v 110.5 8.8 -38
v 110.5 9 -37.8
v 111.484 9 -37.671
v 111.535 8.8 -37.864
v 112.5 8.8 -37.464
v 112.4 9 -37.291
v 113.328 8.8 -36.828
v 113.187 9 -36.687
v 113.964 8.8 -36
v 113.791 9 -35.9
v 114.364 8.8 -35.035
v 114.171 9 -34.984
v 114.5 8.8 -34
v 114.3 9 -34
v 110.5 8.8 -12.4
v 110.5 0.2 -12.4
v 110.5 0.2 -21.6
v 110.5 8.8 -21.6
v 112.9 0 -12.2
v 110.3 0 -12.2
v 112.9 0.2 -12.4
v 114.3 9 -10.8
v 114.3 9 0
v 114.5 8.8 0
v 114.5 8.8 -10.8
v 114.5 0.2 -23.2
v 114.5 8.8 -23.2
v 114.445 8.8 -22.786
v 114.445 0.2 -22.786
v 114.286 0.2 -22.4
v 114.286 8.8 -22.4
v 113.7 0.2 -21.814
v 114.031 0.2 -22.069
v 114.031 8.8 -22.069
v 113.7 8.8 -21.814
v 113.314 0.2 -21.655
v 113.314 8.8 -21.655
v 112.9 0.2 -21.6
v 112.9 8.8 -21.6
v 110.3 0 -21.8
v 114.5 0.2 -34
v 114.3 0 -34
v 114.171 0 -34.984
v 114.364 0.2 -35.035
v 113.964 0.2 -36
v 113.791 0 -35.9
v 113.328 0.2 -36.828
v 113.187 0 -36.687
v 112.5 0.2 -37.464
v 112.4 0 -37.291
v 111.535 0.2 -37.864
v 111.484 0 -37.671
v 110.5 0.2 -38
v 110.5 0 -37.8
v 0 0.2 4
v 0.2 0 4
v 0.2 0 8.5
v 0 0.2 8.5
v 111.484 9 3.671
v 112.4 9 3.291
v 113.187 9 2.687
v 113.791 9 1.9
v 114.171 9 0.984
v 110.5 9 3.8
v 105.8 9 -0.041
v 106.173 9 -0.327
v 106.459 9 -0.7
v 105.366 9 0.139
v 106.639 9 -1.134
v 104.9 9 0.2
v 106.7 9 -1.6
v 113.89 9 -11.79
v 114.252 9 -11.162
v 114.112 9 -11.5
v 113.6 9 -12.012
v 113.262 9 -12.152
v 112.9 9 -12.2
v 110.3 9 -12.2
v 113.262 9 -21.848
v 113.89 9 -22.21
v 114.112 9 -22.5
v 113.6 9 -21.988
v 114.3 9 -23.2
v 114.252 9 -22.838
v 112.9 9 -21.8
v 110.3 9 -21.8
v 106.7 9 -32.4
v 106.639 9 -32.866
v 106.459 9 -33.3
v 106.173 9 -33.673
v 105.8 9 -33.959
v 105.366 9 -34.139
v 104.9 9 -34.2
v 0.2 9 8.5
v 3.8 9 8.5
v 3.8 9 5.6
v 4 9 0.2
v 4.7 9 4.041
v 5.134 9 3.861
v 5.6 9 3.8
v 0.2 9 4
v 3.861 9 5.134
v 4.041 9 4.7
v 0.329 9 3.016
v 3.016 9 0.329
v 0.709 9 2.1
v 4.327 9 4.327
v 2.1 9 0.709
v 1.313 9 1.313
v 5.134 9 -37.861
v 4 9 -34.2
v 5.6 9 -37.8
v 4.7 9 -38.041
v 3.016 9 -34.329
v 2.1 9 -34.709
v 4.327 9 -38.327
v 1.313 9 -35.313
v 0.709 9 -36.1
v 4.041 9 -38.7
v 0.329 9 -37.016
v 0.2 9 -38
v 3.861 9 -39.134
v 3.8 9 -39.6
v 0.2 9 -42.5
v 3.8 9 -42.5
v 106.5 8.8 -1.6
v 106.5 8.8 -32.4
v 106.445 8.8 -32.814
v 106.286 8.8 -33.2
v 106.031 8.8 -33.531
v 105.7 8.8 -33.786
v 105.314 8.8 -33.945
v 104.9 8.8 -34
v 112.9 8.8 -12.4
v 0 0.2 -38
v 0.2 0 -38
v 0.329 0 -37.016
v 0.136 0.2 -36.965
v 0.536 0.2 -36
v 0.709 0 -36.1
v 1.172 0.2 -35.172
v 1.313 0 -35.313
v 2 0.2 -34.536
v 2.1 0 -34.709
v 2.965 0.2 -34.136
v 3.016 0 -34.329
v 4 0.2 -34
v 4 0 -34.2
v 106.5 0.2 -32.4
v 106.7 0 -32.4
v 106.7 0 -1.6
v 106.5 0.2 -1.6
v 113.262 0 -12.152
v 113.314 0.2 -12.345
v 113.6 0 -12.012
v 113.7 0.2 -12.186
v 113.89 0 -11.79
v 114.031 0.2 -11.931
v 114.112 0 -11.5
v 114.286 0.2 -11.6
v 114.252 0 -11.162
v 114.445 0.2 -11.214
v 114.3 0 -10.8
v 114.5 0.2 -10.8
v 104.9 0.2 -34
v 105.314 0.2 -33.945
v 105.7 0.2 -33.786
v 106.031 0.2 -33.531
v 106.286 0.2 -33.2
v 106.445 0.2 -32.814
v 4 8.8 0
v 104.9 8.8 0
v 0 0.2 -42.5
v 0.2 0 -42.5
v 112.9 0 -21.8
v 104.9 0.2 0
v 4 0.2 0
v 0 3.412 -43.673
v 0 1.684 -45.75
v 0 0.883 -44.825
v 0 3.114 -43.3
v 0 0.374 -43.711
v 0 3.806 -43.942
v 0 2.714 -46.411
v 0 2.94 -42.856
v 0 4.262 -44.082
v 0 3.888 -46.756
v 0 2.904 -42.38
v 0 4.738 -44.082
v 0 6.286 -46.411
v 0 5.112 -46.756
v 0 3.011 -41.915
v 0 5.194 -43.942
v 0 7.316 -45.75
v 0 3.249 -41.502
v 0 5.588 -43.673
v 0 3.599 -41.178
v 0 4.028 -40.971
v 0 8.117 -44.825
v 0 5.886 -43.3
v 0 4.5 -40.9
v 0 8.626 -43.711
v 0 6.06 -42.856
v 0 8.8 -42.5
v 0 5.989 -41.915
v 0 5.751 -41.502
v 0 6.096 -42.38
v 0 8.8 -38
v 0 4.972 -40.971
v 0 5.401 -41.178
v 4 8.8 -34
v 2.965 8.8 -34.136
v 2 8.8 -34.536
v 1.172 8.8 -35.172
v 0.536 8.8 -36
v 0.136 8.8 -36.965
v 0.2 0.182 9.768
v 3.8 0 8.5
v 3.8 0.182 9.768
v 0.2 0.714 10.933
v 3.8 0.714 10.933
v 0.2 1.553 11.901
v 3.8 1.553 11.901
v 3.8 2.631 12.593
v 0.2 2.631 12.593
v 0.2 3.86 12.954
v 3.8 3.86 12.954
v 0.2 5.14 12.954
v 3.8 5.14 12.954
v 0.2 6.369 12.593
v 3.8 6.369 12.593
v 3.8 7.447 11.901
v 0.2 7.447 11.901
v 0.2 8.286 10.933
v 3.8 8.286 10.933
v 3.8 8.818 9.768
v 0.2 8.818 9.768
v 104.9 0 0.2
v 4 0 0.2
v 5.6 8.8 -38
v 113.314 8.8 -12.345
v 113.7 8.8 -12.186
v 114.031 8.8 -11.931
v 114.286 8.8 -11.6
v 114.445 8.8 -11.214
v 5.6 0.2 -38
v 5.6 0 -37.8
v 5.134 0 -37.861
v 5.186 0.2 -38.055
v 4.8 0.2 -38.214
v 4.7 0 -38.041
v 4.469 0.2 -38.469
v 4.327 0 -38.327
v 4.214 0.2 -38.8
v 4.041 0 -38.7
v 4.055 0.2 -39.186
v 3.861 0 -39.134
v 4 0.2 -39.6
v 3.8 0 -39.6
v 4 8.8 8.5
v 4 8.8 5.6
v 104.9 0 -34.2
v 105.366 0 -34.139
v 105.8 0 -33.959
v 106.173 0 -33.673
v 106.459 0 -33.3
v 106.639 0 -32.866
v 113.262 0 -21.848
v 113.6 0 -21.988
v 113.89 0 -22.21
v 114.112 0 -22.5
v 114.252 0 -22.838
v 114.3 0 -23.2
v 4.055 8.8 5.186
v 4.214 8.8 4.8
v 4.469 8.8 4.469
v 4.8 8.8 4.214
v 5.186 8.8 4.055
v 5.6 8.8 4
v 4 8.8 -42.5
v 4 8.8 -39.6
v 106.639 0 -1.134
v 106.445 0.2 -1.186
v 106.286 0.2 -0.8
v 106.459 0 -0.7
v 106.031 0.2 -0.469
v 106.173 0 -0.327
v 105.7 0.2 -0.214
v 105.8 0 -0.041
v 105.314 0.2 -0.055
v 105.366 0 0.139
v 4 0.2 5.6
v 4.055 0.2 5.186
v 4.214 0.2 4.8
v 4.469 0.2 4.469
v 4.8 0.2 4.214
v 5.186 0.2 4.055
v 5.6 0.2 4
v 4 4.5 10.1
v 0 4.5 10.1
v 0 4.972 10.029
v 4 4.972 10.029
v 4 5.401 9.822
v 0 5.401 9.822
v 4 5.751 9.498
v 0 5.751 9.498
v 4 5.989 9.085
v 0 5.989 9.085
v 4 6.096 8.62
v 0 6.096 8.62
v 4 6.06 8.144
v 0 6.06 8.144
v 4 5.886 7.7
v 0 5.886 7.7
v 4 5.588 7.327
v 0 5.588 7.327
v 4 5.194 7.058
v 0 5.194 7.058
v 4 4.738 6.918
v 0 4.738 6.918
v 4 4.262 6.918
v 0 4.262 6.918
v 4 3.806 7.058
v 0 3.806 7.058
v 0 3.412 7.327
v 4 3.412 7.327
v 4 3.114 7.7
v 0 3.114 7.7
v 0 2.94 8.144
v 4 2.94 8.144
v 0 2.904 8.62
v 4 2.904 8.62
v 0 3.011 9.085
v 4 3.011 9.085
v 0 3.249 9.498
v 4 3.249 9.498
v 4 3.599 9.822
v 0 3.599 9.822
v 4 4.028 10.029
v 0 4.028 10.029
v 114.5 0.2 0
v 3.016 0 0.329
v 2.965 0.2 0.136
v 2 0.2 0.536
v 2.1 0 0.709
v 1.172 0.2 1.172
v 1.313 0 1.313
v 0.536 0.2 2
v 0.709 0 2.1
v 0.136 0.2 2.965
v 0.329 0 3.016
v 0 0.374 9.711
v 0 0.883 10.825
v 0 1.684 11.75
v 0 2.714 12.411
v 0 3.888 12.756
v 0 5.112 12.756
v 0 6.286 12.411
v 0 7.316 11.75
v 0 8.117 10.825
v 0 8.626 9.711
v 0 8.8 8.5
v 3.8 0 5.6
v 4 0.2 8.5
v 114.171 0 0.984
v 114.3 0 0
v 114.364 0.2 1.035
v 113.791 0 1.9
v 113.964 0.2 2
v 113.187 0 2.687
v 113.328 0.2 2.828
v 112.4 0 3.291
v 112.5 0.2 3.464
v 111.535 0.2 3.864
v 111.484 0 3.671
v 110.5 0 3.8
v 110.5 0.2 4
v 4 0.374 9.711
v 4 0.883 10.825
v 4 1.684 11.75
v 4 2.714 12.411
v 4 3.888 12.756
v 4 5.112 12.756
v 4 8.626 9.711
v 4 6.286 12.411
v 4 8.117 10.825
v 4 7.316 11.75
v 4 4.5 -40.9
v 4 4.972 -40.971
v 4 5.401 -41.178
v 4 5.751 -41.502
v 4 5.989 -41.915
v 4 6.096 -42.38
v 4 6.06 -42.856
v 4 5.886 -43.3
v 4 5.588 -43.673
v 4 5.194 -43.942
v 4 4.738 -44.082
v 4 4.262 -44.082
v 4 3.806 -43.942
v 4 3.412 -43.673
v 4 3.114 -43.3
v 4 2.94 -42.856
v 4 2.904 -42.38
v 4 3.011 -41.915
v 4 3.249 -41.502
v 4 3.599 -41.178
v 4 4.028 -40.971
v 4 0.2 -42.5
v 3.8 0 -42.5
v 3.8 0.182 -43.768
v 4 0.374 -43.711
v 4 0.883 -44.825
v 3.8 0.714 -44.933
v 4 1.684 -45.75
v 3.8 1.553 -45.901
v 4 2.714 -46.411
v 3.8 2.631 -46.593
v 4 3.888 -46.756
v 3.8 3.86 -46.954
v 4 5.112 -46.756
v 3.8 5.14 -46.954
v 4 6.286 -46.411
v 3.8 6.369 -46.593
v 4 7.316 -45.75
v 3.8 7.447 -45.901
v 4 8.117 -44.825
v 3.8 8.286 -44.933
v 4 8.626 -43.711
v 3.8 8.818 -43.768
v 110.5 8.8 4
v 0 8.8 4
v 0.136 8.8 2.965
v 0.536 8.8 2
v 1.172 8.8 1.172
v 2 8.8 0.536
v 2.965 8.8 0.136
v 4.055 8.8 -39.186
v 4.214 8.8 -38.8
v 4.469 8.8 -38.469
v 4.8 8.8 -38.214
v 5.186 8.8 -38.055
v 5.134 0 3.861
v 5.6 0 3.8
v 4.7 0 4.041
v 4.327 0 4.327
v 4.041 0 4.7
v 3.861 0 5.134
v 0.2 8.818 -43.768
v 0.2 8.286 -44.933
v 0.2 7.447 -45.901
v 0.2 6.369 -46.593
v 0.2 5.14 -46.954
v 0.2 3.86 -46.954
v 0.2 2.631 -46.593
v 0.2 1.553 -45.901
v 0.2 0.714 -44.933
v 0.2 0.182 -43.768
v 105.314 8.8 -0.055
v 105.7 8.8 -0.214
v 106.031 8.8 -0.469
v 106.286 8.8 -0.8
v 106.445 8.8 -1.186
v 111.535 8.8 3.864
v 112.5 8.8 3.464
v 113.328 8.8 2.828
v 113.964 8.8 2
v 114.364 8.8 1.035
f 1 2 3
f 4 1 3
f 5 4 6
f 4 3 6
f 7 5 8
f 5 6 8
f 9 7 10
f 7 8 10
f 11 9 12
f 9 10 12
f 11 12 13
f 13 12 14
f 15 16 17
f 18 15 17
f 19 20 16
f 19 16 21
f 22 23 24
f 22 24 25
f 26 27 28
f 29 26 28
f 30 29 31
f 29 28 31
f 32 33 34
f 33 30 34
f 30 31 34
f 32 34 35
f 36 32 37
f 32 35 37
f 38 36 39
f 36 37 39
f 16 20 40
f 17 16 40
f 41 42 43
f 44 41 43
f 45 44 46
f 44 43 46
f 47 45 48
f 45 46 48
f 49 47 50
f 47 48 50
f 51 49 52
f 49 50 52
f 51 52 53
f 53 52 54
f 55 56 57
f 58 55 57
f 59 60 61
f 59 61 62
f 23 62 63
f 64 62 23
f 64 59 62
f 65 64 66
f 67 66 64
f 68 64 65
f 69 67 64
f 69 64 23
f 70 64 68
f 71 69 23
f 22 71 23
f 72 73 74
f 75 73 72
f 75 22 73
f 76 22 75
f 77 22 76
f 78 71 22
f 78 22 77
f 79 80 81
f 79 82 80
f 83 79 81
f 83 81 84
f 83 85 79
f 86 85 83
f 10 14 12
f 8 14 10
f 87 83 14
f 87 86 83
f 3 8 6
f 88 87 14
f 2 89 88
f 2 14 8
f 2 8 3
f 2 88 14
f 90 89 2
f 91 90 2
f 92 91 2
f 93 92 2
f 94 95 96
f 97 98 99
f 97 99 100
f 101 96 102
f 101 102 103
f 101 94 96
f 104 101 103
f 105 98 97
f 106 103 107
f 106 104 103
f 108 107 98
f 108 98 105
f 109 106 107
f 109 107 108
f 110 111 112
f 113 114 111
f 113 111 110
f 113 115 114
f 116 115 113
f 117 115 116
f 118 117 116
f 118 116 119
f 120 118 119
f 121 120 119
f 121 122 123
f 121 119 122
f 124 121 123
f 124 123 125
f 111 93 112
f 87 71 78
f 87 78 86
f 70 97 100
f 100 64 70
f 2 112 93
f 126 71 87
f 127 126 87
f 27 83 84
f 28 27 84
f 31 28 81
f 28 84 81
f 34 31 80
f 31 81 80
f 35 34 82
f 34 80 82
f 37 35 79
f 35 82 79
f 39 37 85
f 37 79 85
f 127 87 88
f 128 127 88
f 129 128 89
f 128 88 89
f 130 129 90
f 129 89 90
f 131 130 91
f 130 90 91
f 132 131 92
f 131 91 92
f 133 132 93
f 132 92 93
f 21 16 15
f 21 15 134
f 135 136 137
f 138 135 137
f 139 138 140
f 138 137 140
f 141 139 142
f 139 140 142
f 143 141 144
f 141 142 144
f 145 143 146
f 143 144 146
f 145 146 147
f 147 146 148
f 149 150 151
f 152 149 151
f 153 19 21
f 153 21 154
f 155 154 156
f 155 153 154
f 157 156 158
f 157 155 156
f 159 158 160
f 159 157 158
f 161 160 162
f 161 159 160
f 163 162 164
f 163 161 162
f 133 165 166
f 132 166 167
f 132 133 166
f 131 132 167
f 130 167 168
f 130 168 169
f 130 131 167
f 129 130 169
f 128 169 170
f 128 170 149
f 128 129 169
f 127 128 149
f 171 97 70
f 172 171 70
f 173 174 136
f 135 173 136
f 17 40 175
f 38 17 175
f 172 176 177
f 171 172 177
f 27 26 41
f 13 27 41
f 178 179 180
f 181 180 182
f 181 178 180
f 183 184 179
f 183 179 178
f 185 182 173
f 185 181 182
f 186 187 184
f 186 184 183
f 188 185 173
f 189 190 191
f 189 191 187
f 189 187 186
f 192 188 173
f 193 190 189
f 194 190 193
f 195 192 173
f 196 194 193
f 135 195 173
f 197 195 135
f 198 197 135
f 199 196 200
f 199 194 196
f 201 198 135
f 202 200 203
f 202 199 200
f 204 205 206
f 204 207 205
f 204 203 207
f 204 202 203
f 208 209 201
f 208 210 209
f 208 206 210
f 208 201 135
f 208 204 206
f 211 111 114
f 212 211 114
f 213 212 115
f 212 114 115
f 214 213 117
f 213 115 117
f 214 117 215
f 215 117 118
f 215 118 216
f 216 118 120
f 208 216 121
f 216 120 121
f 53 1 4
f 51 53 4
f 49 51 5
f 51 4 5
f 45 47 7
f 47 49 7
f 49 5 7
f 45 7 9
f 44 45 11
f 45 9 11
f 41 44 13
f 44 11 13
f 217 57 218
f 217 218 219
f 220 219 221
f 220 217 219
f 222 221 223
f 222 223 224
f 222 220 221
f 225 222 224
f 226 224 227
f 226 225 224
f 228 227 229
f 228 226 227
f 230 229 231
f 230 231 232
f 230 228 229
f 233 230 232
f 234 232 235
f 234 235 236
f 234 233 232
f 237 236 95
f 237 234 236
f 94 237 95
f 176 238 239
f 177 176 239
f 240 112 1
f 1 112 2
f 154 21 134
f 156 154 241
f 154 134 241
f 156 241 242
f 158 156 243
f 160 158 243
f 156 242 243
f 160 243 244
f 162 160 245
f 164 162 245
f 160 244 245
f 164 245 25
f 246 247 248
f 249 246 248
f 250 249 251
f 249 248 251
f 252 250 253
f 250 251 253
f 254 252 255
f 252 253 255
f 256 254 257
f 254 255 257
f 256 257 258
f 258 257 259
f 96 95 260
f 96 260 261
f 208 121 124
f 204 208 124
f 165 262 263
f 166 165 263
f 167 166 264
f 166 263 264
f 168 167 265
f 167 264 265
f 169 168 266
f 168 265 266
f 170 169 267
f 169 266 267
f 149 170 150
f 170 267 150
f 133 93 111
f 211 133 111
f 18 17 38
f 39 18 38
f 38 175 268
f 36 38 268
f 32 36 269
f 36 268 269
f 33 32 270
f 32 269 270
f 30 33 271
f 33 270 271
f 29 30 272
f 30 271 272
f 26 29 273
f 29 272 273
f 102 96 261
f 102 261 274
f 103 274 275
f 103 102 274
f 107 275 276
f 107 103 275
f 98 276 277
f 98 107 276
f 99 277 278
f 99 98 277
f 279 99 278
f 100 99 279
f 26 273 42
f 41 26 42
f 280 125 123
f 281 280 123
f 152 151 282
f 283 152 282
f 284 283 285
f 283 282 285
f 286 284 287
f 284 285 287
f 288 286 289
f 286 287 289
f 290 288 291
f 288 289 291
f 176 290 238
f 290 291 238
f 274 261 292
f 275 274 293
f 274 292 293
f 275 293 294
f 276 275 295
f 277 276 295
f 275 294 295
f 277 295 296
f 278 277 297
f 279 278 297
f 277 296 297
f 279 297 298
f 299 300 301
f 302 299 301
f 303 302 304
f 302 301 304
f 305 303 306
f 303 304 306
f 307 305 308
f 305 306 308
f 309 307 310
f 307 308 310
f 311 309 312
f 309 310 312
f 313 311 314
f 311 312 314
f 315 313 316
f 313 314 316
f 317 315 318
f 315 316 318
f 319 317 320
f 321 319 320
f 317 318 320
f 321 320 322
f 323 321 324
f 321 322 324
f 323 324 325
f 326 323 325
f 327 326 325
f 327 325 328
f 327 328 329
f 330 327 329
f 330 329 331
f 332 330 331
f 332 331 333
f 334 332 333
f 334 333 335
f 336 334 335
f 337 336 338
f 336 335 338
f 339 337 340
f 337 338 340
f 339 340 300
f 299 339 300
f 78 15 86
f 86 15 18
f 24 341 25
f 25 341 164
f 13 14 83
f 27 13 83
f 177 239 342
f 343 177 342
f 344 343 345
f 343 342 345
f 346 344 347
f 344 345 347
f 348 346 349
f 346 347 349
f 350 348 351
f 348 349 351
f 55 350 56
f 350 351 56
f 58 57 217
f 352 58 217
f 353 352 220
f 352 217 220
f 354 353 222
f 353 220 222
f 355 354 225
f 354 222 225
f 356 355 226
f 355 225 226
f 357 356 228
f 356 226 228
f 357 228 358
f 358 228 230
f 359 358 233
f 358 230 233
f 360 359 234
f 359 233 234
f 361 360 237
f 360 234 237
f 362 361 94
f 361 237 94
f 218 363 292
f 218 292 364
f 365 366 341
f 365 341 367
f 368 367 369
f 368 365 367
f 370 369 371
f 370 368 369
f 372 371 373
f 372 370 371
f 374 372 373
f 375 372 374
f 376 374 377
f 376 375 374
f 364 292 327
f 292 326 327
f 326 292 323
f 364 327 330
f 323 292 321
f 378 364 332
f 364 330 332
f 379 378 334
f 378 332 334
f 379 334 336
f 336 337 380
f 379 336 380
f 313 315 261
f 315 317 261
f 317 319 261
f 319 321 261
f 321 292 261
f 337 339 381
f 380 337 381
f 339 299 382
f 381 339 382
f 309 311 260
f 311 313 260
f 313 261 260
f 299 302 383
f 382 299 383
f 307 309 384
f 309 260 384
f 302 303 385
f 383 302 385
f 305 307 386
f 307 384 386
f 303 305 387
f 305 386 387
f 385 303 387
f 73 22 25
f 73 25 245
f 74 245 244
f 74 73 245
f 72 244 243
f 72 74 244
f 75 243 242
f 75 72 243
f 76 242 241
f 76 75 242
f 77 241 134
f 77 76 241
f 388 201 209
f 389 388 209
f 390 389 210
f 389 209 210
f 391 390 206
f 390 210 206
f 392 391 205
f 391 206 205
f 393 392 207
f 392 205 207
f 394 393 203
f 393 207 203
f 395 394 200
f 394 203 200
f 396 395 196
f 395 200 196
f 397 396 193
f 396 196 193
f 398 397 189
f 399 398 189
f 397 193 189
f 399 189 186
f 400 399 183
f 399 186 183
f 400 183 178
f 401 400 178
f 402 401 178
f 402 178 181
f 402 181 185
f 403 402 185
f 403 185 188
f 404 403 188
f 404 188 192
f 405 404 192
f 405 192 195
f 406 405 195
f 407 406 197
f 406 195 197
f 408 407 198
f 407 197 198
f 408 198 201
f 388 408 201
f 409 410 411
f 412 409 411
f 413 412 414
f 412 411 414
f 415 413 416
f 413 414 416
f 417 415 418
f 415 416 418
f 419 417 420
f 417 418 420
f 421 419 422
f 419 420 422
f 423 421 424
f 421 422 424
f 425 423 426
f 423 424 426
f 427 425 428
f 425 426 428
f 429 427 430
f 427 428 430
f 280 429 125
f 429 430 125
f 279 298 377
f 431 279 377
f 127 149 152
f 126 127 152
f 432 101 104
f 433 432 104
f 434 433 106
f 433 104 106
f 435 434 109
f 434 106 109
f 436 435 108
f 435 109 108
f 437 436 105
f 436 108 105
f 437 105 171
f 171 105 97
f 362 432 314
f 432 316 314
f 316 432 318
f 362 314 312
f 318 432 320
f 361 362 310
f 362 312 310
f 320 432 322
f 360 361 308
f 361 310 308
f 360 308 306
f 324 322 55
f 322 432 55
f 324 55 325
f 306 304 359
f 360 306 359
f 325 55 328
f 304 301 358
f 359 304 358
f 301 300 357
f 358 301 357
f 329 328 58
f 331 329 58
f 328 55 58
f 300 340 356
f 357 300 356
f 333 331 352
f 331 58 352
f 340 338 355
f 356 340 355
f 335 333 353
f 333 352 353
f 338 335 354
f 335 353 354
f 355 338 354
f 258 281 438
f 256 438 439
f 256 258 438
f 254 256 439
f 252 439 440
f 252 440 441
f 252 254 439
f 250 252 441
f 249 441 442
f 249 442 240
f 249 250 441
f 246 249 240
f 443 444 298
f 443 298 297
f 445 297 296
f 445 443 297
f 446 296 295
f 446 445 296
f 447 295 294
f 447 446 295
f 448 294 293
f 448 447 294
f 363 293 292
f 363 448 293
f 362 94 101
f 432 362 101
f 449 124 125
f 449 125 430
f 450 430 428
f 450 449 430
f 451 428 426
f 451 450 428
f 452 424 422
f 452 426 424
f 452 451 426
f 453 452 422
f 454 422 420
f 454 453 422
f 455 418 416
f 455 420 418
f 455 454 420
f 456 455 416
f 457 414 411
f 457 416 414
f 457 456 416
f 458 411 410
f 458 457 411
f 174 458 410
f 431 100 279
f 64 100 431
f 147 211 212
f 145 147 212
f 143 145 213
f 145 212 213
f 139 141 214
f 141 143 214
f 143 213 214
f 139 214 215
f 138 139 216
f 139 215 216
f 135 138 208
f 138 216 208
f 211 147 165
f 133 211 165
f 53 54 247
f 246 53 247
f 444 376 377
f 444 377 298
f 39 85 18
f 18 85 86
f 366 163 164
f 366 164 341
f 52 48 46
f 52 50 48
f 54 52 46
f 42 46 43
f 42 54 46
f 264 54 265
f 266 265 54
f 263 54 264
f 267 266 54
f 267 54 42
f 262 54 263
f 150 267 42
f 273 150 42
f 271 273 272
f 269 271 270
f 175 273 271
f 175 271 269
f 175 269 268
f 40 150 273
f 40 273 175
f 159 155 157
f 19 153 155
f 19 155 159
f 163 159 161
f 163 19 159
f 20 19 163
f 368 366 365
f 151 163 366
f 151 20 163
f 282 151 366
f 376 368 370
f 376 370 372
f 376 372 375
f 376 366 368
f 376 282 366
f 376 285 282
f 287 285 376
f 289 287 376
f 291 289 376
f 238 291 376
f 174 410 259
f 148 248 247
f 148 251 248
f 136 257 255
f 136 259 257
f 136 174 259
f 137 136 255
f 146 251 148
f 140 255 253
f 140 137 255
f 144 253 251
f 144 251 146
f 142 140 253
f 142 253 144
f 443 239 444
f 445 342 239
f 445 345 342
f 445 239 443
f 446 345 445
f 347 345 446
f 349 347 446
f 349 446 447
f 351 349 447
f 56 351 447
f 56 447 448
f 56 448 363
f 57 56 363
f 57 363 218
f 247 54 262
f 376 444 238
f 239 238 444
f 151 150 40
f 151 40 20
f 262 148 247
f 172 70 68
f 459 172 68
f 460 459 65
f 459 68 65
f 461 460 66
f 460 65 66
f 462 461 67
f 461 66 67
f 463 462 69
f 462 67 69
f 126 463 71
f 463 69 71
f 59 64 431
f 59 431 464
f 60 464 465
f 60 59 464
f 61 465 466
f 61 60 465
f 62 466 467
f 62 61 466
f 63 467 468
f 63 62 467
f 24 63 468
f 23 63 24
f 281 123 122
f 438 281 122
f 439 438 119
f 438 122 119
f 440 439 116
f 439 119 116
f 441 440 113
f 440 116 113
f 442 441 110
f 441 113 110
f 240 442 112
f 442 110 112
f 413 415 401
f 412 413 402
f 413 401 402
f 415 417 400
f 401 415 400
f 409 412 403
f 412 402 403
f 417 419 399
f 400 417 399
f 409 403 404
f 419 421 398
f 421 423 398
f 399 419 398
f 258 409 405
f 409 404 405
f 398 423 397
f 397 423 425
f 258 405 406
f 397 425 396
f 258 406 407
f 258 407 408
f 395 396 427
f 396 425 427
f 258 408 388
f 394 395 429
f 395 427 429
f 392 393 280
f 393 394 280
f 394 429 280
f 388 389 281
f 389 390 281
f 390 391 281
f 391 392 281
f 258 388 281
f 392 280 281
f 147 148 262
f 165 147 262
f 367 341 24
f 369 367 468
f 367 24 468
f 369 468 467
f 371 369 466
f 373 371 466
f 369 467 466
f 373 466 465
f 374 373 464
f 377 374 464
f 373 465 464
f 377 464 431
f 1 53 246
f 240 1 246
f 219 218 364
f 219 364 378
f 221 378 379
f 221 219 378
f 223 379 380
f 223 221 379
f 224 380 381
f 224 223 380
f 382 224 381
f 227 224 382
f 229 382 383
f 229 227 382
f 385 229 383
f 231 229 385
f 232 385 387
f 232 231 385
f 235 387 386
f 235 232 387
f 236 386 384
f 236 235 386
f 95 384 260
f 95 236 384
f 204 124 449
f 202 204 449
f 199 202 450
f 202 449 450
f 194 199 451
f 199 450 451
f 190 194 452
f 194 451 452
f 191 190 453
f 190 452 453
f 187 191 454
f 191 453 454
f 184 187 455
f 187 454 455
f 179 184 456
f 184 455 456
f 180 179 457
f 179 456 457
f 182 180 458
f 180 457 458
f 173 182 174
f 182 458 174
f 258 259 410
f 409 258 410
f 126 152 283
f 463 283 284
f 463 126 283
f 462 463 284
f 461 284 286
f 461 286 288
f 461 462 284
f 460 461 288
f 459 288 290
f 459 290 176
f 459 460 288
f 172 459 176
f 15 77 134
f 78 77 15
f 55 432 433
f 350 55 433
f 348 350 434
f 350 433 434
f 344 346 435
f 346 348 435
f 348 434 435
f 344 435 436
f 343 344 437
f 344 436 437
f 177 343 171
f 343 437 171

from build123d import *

# Parameters (mm, degrees)
SKETCH_1_W      = 4
SKETCH_1_H      = 16.4
EXTRUDE_1_DEPTH = 9
SKETCH_2_R      = 4.5
SKETCH_2_R_2    = 1.6
EXTRUDE_2_DEPTH = 4
FILLET_1_R      = 4
FILLET_2_R      = 1.6
CHAMFER_1_SIZE  = 0.2


with BuildPart() as part:
    # 草图1 → 凸台-拉伸1 (new body)
    with BuildSketch(Plane(origin=(0, 0, 0), x_dir=(1, 0, 0), z_dir=(0, 1, 0))):
        Polygon((106.5, 0), (0, 0), (0, -4), (110.5, -4), (110.5, 38), (0, 38), (0, 34), (106.5, 34), align=None)
        with Locations((112.5, 29.8)):
            Rectangle(SKETCH_1_W, SKETCH_1_H)
        with Locations((112.5, 4.2)):
            Rectangle(SKETCH_1_W, SKETCH_1_H)
    extrude(amount=EXTRUDE_1_DEPTH)

    # 草图2 → 凸台-拉伸2 (add)
    # profile 1 of 6: a face of its own
    with BuildSketch(Plane.ZY):
        with Locations((-42.5, 4.5)):
            Circle(SKETCH_2_R)
        with Locations((-42.5, 4.5)):
            Circle(SKETCH_2_R_2, mode=Mode.SUBTRACT)
    # profile 2 of 6: a face of its own
    with BuildSketch(Plane.ZY):
        with BuildLine():
            Line((-38, 9), (-42.5, 9))
            ThreePointArc((-42.5, 9), (-39.318019485, 7.681980515), (-38, 4.5))
            Line((-38, 4.5), (-38, 9))
        make_face()
    # profile 3 of 6: a face of its own
    with BuildSketch(Plane.ZY):
        with BuildLine():
            ThreePointArc((-38, 4.5), (-39.318019485, 1.318019485), (-42.5, 0))
            Line((-42.5, 0), (-38, 0))
            Line((-38, 0), (-38, 4.5))
        make_face()
    # profile 4 of 6: a face of its own
    with BuildSketch(Plane.ZY):
        with Locations((8.5, 4.5)):
            Circle(SKETCH_2_R)
        with Locations((8.5, 4.5)):
            Circle(SKETCH_2_R_2, mode=Mode.SUBTRACT)
    # profile 5 of 6: a face of its own
    with BuildSketch(Plane.ZY):
        with BuildLine():
            Line((8.5, 9), (4, 9))
            Line((4, 9), (4, 4.499999989))
            ThreePointArc((4, 4.499999989), (5.318019481, 7.681980511), (8.5, 9))
        make_face()
    # profile 6 of 6: a face of its own
    with BuildSketch(Plane.ZY):
        with BuildLine():
            ThreePointArc((8.5, 0), (5.318019489, 1.318019481), (4, 4.499999989))
            Line((4, 4.499999989), (4, 0))
            Line((4, 0), (8.5, 0))
        make_face()
    extrude(amount=-EXTRUDE_2_DEPTH)

    # 圆角1
    fillet_1_edges = [part.edges().sort_by_distance(p)[0] for p in [
        (0, 4.5, -34),
        (114.5, 4.5, -38),
        (114.5, 4.5, 4),
        (0, 4.5, 0),
    ]]
    fillet(fillet_1_edges, radius=FILLET_1_R)

    # 圆角2
    fillet_2_edges = [part.edges().sort_by_distance(p)[0] for p in [
        (106.5, 4.5, 0),
        (106.5, 4.5, -34),
        (114.5, 4.5, -21.6),
        (114.5, 4.5, -12.4),
        (4, 4.5, -38),
        (4, 4.5, 4),
    ]]
    fillet(fillet_2_edges, radius=FILLET_2_R)

    # 倒角1
    chamfer_1_edges = [part.edges().sort_by_distance(p)[0] for p in [
        (111.7, 0, -12.4),
        (111.7, 9, -12.4),
        (58.05, 0, -38),
        (111.7, 0, -21.6),
        (54.45, 0, 0),
        (106.5, 0, -17),
        (114.03137085, 0, -22.06862915),
        (114.03137085, 0, -11.93137085),
        (58.05, 9, -38),
        (4, 9, -41.05),
        (106.5, 9, -17),
        (54.45, 9, 0),
        (4, 9, 7.05),
        (111.7, 9, -21.6),
        (114.03137085, 9, -22.06862915),
        (114.03137085, 9, -11.93137085),
        (4.46862915, 9, 4.46862915),
        (4.46862915, 0, 4.46862915),
        (4.46862915, 0, -38.46862915),
        (4.46862915, 9, -38.46862915),
        (106.03137085, 0, -0.46862915),
        (106.03137085, 9, -0.46862915),
        (106.03137085, 0, -33.53137085),
        (106.03137085, 9, -33.53137085),
        (110.5, 0, -17),
        (110.5, 9, -17),
        (0, 4.5, -47),
        (4, 0, -41.05),
        (4, 4.5, -47),
        (4, 4.5, 13),
        (4, 0, 7.05),
        (0, 4.5, 13),
        (54.45, 0, -34),
        (0, 0, -40.25),
        (114.5, 0, -28.6),
        (114.5, 0, -5.4),
        (58.05, 0, 4),
        (0, 0, 6.25),
        (1.171572875, 0, -35.171572875),
        (1.171572875, 0, 1.171572875),
        (113.328427125, 0, 2.828427125),
        (113.328427125, 0, -36.828427125),
        (114.5, 9, -28.6),
        (0, 9, 6.25),
        (58.05, 9, 4),
        (114.5, 9, -5.4),
        (0, 9, -40.25),
        (54.45, 9, -34),
        (1.171572875, 9, -35.171572875),
        (1.171572875, 9, 1.171572875),
        (113.328427125, 9, 2.828427125),
        (113.328427125, 9, -36.828427125),
    ]]
    chamfer(chamfer_1_edges, length=CHAMFER_1_SIZE)


solid = part.part
